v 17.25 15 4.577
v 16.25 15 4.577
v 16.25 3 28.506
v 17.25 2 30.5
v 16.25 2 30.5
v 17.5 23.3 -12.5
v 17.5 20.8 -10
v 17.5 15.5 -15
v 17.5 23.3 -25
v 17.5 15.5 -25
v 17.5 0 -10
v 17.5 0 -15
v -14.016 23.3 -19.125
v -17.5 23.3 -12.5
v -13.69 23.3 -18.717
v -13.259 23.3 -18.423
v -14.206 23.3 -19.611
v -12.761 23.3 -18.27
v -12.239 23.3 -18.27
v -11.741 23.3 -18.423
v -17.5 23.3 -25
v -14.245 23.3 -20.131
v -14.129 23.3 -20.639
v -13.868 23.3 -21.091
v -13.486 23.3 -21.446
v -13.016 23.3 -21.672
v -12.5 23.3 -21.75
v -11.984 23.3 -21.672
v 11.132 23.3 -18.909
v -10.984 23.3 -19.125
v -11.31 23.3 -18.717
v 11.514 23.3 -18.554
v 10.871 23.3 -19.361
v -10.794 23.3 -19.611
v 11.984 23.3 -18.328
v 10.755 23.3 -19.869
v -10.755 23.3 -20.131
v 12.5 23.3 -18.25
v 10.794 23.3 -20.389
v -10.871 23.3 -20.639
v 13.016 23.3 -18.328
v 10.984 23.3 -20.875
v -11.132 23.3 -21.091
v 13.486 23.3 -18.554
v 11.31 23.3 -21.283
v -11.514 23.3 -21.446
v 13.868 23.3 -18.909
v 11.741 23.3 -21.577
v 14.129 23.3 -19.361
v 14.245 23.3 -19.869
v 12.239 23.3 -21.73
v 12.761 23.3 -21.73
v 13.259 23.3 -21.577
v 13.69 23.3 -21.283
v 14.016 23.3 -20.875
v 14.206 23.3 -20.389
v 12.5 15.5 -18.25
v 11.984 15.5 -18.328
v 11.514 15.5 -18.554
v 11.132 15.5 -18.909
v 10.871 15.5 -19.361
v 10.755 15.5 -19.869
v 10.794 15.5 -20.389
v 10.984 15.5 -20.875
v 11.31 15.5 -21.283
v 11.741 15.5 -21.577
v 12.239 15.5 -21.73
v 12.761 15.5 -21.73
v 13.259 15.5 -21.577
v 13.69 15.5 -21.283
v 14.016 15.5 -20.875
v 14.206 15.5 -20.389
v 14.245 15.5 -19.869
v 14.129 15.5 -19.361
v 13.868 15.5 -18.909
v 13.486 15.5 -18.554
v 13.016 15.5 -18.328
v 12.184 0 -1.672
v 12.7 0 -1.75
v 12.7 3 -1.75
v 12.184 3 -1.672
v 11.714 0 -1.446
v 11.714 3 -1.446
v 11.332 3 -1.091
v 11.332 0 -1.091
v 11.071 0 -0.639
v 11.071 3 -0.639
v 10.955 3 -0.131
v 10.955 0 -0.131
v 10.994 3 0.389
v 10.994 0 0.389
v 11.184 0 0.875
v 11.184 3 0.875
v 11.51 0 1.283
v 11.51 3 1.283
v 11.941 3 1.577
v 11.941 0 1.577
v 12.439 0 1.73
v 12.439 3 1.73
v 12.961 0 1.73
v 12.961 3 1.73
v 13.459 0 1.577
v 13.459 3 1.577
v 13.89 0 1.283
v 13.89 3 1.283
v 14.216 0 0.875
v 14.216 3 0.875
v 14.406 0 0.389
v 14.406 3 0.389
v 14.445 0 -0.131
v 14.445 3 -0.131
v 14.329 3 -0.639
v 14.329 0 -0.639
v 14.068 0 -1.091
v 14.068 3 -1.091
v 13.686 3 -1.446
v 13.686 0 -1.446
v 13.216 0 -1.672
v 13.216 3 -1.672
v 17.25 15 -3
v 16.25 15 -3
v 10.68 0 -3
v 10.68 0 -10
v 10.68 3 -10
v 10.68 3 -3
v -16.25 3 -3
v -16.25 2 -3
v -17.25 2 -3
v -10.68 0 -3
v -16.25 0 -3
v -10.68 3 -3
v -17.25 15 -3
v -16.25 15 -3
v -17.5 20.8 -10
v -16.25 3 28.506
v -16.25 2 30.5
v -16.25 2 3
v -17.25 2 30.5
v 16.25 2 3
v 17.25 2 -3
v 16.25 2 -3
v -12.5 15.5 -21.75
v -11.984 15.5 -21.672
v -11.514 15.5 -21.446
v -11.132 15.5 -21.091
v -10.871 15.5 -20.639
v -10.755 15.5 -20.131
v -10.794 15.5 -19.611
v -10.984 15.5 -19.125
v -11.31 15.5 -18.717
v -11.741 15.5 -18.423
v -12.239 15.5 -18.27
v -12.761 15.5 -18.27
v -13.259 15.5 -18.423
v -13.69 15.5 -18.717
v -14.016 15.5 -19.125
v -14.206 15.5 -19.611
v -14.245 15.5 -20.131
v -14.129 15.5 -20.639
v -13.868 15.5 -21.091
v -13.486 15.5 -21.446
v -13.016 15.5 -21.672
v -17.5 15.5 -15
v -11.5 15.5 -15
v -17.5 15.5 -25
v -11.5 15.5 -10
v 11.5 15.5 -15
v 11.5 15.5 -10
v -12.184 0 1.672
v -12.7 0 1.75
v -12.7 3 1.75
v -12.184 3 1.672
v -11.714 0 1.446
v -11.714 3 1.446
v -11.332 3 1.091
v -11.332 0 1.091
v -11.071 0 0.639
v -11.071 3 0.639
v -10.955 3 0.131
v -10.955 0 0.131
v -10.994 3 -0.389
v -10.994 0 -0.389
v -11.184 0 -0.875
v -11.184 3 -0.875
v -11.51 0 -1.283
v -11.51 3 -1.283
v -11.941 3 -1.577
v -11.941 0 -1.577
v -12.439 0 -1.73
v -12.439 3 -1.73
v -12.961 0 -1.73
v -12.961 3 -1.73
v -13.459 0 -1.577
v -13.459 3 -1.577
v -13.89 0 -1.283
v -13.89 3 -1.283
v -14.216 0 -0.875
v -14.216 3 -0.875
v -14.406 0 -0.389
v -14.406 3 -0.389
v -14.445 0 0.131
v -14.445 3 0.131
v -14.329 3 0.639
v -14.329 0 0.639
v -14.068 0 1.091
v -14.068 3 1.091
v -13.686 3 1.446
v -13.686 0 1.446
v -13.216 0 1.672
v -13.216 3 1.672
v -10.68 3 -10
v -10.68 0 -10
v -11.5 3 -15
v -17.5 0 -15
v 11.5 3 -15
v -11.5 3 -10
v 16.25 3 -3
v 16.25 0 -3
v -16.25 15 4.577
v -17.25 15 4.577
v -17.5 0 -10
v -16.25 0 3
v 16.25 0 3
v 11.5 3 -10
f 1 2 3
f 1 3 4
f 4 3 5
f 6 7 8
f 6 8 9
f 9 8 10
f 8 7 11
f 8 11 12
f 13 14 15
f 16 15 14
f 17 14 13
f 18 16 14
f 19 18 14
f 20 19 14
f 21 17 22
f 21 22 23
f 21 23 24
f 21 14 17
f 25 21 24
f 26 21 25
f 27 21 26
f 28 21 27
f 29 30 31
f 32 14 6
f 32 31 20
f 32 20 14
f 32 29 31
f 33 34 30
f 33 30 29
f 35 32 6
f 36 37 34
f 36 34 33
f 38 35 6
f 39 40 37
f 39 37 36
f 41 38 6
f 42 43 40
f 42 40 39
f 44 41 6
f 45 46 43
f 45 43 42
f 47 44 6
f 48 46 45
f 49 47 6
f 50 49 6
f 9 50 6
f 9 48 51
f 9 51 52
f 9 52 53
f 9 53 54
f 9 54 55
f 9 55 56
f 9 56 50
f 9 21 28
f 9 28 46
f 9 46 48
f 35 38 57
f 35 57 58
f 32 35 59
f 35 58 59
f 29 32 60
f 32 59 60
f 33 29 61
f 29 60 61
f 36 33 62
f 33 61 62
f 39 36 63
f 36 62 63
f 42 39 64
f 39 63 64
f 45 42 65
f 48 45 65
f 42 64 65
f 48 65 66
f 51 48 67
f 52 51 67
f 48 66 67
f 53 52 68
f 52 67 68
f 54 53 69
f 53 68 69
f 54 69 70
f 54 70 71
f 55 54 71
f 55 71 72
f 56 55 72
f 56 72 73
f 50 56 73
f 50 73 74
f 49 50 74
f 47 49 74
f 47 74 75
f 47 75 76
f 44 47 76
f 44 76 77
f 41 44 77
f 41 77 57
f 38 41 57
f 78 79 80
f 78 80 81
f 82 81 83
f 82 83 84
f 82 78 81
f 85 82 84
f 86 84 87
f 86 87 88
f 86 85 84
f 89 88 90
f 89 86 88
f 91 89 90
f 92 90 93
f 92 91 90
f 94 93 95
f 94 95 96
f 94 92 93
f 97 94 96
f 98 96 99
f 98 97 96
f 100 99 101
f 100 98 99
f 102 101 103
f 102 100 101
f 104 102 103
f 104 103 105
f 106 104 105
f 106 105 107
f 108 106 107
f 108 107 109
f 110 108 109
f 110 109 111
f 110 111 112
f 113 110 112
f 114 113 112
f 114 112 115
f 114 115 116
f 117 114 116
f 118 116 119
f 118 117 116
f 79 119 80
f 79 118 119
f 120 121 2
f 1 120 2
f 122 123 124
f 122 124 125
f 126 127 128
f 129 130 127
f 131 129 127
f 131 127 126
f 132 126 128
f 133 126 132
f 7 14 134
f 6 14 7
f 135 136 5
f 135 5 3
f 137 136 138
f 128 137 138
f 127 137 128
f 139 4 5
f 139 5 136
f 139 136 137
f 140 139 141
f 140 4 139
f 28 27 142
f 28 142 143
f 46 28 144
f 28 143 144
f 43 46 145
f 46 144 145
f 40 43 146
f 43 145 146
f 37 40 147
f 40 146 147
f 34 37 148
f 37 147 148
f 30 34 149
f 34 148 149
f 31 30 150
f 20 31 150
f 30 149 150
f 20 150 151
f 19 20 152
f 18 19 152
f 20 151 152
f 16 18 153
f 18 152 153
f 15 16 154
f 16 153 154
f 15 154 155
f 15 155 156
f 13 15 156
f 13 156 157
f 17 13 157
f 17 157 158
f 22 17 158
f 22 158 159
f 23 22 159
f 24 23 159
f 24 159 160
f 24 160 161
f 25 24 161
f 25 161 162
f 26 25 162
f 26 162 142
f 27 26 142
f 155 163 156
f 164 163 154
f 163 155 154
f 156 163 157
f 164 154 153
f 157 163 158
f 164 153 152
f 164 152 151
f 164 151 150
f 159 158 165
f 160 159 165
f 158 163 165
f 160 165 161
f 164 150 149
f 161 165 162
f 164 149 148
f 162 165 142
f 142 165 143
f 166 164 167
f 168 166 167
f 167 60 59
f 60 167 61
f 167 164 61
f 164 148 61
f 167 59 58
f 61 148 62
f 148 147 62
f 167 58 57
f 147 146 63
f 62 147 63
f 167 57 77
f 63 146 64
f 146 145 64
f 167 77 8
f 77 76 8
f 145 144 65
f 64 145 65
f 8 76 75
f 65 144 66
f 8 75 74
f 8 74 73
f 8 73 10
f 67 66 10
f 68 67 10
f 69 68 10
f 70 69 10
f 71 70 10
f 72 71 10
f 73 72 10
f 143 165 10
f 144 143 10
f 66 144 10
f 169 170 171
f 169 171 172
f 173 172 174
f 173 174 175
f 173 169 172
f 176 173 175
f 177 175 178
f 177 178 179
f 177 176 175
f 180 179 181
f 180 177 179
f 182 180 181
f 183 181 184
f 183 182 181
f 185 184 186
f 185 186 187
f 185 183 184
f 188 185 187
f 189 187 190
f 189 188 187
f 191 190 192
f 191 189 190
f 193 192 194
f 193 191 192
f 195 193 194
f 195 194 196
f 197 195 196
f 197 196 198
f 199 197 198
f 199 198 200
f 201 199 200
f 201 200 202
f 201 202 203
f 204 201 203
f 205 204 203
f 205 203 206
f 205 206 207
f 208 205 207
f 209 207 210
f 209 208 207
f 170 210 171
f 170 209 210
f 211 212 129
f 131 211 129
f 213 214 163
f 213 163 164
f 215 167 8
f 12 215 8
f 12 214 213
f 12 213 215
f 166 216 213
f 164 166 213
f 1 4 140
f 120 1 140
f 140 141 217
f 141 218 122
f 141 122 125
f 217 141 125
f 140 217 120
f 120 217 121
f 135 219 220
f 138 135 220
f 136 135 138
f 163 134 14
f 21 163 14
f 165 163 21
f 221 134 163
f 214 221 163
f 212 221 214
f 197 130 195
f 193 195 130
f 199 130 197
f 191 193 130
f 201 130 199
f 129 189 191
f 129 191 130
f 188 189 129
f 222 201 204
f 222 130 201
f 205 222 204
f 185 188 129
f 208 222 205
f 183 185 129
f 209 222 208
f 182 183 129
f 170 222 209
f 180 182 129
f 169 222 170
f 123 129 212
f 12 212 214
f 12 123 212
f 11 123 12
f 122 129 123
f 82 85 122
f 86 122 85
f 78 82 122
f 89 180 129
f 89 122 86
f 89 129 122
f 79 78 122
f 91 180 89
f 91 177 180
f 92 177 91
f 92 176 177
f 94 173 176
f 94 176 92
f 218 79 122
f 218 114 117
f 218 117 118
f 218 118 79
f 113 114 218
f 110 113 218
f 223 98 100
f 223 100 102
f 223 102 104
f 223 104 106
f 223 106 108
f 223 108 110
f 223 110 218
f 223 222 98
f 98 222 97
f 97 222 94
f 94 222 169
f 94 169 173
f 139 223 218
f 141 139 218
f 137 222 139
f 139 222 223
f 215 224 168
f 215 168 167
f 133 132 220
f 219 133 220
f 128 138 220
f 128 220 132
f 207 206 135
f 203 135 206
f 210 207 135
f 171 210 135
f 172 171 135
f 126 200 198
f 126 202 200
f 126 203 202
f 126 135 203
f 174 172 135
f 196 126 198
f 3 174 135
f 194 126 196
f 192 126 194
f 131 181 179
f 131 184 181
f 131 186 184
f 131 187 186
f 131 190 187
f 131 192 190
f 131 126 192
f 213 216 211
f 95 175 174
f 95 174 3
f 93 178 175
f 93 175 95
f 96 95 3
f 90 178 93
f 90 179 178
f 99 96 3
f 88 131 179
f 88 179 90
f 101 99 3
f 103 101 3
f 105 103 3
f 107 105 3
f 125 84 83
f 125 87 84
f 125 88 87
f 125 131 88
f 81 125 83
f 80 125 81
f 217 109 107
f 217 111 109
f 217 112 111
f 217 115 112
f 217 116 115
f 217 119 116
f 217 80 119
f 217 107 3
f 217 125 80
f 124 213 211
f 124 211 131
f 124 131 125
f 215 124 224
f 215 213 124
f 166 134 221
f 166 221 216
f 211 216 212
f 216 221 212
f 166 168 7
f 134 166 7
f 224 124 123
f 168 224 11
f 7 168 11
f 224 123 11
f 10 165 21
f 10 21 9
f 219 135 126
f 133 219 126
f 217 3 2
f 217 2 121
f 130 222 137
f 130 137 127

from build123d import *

# Parameters (mm, degrees)
SKETCH1_W           = 32.5
SKETCH1_H           = 6
SKETCH1_R           = 1.75
BOSS_EXTRUDE1_DEPTH = 3
SKETCH2_W           = 21.36
SKETCH2_H           = 12
BOSS_EXTRUDE2_DEPTH = 3
SKETCH3_W           = 35
SKETCH3_H           = 5
BOSS_EXTRUDE3_DEPTH = 3
SKETCH4_W           = 6
SKETCH4_H           = 5
BOSS_EXTRUDE4_DEPTH = 12.5
SKETCH5_W           = 35
SKETCH5_H           = 15
BOSS_EXTRUDE5_DEPTH = 7.8
CHAMFER1_SIZE       = 2.5
SKETCH6_R           = 1.75
CUT_EXTRUDE1_DEPTH  = 35.22718218
BOSS_EXTRUDE6_DEPTH = 1
SKETCH8_W           = 32.5
SKETCH8_H           = 1
BOSS_EXTRUDE7_DEPTH = 27.5
CUT_EXTRUDE2_DEPTH  = 33.5
CUT_EXTRUDE3_DEPTH  = 52.775500963


with BuildPart() as part:
    # Sketch1 → Boss-Extrude1 (new body)
    with BuildSketch(Plane(origin=(0, 0, 0), x_dir=(1, 0, 0), z_dir=(0, 1, 0))):
        Rectangle(SKETCH1_W, SKETCH1_H)
        with Locations(Location((-12.7, 0, 0), (0, 0, 270))):
            Circle(SKETCH1_R, mode=Mode.SUBTRACT)
        with Locations(Location((12.7, 0, 0), (0, 0, 90))):
            Circle(SKETCH1_R, mode=Mode.SUBTRACT)
    extrude(amount=BOSS_EXTRUDE1_DEPTH)

    # Sketch2 → Boss-Extrude2 (add)
    with BuildSketch(Plane.XZ):
        with Locations((0, -9)):
            Rectangle(SKETCH2_W, SKETCH2_H)
    extrude(amount=-BOSS_EXTRUDE2_DEPTH)

    # Sketch3 → Boss-Extrude3 (add)
    with BuildSketch(Plane.XZ):
        with Locations((0, -12.5)):
            Rectangle(SKETCH3_W, SKETCH3_H)
    extrude(amount=-BOSS_EXTRUDE3_DEPTH)

    # Sketch4 → Boss-Extrude4 (add)
    with BuildSketch(Plane(origin=(0, 3, 0), x_dir=(1, 0, 0), z_dir=(0, 1, 0))):
        with Locations((-14.5, 12.5)):
            Rectangle(SKETCH4_W, SKETCH4_H)
        with Locations((14.5, 12.5)):
            Rectangle(SKETCH4_W, SKETCH4_H)
    extrude(amount=BOSS_EXTRUDE4_DEPTH)

    # Sketch5 → Boss-Extrude5 (add)
    with BuildSketch(Plane(origin=(0, 15.5, 0), x_dir=(1, 0, 0), z_dir=(0, 1, 0))):
        with Locations((0, 17.5)):
            Rectangle(SKETCH5_W, SKETCH5_H)
    extrude(amount=BOSS_EXTRUDE5_DEPTH)

    # Chamfer1
    chamfer1_edges = [part.edges().sort_by_distance(p)[0] for p in [
        (0, 23.3, -10),
    ]]
    chamfer(chamfer1_edges, length=CHAMFER1_SIZE)

    # Sketch6 → Cut-Extrude1 (cut, through all)
    with BuildSketch(Plane.XZ.offset(-15.5)):
        with Locations(Location((-12.5, -20, 0), (0, 0, 270))):
            Circle(SKETCH6_R)
        with Locations(Location((12.5, -20, 0), (0, 0, 90))):
            Circle(SKETCH6_R)
    extrude(amount=-CUT_EXTRUDE1_DEPTH, mode=Mode.SUBTRACT)

    # Sketch7 → Boss-Extrude6 (add)
    with BuildSketch(Plane.ZY.offset(16.25)):
        Polygon((-3, 2), (-3, 18.8), (30.5, 2), align=None)
    boss_extrude6 = extrude(amount=BOSS_EXTRUDE6_DEPTH)

    # Mirror1: Boss-Extrude6 across plane
    add(boss_extrude6.mirror(Plane(origin=(0, 0, 0), x_dir=(0, 0, 1), z_dir=(1, 0, 0))))

    # Sketch8 → Boss-Extrude7 (add)
    with BuildSketch(Plane.XY.offset(3)):
        with Locations((0, 2.5)):
            Rectangle(SKETCH8_W, SKETCH8_H)
    extrude(amount=BOSS_EXTRUDE7_DEPTH)

    # Sketch9 → Cut-Extrude2 (cut)
    with BuildSketch(Plane(origin=(16.25, 0, 0), x_dir=(0, 0, -1), z_dir=(1, 0, 0))):
        Polygon((-30.5, 2), (-28.505952381, 3), (-30.5, 3), align=None)
    extrude(amount=-CUT_EXTRUDE2_DEPTH, mode=Mode.SUBTRACT)

    # Sketch10 → Cut-Extrude3 (cut, through all)
    with BuildSketch(Plane.ZY.offset(17.25)):
        Polygon((-3, 15), (4.577380952, 15), (-3, 18.8), align=None)
    extrude(amount=-CUT_EXTRUDE3_DEPTH, mode=Mode.SUBTRACT)


solid = part.part
